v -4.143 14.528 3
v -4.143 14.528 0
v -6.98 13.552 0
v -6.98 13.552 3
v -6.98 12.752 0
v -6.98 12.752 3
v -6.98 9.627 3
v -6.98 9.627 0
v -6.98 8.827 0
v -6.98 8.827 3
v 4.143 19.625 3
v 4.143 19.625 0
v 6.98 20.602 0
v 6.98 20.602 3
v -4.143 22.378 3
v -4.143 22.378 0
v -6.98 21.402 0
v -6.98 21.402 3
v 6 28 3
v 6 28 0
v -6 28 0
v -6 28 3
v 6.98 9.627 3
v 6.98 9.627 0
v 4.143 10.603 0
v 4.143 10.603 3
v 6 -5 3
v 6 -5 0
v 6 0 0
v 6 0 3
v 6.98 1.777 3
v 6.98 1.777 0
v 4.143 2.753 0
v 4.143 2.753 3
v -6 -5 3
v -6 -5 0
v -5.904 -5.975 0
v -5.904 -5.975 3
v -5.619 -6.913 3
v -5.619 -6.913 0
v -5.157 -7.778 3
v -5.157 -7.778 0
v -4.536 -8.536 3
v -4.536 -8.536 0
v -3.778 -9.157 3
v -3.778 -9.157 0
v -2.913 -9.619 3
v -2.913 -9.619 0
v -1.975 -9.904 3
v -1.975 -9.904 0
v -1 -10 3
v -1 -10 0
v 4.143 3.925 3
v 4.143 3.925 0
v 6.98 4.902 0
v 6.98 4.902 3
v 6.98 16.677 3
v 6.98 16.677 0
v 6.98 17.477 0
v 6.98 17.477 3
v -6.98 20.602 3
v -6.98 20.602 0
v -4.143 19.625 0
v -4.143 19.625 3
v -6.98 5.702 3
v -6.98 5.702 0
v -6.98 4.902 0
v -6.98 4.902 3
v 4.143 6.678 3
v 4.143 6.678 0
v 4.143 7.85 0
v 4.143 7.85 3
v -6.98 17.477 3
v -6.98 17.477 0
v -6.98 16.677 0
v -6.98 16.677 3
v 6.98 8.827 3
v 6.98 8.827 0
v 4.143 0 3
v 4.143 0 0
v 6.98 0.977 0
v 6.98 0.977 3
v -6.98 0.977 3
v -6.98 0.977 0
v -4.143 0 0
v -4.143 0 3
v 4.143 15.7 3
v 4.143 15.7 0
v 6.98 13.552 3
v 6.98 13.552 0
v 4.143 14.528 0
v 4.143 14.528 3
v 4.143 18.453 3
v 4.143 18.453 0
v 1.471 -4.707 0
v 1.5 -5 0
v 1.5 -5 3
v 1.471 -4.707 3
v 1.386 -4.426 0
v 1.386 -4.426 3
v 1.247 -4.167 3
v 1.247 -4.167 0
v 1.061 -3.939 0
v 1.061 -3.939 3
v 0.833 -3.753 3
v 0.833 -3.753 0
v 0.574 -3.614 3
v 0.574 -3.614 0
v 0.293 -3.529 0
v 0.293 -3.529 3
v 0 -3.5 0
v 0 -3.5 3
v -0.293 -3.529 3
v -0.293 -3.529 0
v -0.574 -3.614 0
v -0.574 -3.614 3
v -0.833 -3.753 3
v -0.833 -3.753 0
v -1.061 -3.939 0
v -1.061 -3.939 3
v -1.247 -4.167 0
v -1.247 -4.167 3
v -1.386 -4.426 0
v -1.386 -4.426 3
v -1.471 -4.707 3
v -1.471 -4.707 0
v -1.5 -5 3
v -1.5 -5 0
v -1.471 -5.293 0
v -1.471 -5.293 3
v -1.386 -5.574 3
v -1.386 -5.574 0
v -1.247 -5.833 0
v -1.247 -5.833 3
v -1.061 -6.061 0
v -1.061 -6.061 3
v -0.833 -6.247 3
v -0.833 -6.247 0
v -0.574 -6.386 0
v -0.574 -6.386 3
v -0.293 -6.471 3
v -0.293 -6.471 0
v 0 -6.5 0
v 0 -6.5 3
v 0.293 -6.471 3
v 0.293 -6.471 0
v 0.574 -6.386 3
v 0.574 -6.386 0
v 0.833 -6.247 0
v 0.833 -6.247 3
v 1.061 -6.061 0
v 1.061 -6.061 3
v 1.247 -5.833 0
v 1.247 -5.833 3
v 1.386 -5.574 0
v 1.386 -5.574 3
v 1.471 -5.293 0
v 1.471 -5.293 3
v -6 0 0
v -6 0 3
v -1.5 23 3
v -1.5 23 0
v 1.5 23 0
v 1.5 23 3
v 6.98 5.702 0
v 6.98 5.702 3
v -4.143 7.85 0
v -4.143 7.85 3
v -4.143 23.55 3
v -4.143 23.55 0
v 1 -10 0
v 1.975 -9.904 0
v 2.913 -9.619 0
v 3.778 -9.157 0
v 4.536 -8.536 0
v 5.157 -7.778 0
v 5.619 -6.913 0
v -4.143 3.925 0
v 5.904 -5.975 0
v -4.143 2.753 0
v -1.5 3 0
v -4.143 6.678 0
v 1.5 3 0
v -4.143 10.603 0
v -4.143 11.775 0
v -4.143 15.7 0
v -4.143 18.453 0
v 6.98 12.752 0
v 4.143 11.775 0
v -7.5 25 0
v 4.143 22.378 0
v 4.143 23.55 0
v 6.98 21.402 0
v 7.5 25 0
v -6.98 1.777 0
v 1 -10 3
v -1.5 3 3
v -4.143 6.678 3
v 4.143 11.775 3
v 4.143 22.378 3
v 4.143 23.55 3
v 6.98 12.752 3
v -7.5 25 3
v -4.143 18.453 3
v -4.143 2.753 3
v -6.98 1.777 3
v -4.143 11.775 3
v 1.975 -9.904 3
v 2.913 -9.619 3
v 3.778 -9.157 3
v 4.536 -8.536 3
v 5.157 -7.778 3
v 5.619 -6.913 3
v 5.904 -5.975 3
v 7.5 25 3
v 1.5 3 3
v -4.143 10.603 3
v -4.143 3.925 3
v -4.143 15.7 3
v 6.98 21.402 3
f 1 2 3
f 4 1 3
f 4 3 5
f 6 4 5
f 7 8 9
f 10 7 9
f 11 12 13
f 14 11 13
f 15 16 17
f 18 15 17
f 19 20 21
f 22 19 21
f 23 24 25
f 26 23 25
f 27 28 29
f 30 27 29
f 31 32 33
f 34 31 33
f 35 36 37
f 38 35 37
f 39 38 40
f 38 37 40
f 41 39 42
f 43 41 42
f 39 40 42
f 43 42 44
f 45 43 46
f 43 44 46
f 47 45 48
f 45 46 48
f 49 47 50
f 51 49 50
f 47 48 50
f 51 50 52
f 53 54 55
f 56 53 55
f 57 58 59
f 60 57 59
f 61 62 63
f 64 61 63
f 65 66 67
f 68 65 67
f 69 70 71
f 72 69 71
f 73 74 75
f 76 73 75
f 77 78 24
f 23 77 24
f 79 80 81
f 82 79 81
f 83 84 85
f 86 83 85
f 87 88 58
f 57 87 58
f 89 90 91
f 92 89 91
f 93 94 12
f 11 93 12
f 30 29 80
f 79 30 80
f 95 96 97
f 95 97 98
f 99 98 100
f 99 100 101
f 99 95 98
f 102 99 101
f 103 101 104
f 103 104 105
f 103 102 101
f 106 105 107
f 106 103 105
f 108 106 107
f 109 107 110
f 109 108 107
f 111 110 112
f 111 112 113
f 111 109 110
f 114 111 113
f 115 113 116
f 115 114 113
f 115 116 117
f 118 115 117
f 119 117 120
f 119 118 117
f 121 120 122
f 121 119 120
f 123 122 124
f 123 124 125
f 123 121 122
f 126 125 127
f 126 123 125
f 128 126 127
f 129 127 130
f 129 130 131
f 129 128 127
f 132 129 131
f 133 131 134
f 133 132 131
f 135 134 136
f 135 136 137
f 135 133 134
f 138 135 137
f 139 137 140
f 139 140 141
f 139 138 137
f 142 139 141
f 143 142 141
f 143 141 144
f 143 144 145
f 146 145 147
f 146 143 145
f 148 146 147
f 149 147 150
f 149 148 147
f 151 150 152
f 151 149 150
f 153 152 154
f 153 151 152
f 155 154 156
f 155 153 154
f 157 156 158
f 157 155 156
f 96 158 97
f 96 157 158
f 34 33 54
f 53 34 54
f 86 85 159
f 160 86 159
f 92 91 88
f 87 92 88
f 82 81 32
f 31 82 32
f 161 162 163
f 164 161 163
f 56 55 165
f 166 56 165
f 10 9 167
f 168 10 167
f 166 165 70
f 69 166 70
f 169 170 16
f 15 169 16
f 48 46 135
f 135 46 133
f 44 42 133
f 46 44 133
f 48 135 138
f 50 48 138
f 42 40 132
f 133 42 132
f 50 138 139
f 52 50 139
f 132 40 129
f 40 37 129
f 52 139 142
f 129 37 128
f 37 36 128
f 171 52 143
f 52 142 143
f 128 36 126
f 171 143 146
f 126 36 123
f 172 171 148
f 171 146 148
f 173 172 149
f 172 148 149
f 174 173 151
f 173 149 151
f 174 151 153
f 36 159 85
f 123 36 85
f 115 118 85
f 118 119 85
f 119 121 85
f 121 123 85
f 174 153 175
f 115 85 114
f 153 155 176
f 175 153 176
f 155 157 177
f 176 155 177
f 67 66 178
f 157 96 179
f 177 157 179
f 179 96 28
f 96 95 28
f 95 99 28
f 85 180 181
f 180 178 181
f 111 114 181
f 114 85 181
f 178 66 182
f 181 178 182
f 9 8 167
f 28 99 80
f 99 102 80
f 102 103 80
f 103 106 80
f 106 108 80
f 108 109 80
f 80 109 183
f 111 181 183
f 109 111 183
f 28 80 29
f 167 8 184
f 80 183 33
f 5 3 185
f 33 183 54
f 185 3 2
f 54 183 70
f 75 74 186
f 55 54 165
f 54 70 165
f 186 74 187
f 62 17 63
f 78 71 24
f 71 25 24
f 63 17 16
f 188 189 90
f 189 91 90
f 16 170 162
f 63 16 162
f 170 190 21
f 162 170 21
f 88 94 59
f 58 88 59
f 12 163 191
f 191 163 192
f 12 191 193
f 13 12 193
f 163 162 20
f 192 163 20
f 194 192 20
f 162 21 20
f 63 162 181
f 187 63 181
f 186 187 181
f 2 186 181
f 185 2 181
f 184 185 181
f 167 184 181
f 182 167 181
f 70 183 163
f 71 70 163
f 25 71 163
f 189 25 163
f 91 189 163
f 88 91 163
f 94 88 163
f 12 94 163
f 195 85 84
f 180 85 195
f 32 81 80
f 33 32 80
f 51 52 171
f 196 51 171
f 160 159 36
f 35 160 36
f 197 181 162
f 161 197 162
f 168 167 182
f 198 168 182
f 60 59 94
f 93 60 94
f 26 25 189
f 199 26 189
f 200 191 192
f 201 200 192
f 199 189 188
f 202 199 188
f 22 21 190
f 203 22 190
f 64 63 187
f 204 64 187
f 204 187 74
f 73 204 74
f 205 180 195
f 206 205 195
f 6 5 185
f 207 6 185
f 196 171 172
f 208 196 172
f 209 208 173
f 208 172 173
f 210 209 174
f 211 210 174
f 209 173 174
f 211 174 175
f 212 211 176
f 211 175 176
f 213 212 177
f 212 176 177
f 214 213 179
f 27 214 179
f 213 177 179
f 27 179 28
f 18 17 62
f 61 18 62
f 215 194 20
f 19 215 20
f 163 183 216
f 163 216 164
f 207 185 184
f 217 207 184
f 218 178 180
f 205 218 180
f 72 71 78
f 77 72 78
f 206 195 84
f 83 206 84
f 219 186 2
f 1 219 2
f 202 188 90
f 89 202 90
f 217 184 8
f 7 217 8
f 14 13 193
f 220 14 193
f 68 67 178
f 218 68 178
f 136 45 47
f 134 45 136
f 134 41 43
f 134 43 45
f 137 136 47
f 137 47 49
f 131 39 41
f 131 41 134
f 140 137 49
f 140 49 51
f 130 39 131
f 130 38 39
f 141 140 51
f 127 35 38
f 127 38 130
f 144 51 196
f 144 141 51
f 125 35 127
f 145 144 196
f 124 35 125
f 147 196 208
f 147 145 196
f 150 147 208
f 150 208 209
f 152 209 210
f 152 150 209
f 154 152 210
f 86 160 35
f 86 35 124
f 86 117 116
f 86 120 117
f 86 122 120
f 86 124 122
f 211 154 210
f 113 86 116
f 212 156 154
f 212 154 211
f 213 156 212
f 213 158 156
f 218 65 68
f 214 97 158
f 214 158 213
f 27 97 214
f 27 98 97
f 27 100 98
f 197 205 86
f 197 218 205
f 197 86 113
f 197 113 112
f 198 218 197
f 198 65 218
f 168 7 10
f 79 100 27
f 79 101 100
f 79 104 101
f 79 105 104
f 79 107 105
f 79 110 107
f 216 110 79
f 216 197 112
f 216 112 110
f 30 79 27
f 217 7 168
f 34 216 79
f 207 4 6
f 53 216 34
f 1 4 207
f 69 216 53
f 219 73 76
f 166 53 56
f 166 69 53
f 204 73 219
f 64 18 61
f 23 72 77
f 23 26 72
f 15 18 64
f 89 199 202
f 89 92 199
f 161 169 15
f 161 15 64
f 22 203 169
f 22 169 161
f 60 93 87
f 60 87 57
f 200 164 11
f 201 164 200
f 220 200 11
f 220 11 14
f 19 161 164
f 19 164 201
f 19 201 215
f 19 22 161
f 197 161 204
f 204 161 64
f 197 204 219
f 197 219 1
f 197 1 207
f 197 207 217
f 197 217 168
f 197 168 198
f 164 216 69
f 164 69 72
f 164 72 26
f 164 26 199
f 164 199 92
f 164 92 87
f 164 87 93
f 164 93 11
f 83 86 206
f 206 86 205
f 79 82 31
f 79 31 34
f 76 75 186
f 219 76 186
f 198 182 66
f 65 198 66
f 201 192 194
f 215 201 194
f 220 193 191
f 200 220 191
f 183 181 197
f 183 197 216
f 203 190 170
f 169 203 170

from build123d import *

# Parameters (mm, degrees)
F0_R     = 1.5
F0_W     = 3
F0_H     = 20
F1_DEPTH = 3
F3_DEPTH = 25


with BuildPart() as f1:
    # F0 (on Top) → F1 (new body)
    with BuildSketch(Plane.XY):
        with BuildLine():
            Line((-7.5, 25), (-7.5, 0))
            Line((-7.5, 0), (-6, 0))
            Line((-6, 0), (-6, -5))
            ThreePointArc((-6, -5), (-4.535534, -8.535534), (-1, -10))
            Line((-1, -10), (1, -10))
            ThreePointArc((1, -10), (4.535534, -8.535534), (6, -5))
            Line((6, -5), (6, 0))
            Line((6, 0), (7.5, 0))
            Line((7.5, 0), (7.5, 25))
            Line((7.5, 25), (6, 28))
            Line((6, 28), (-6, 28))
            Line((-6, 28), (-7.5, 25))
        make_face()
        with Locations((0, -5)):
            Circle(F0_R, mode=Mode.SUBTRACT)
        with Locations((0, 13)):
            Rectangle(F0_W, F0_H, mode=Mode.SUBTRACT)
    extrude(amount=F1_DEPTH)

    # F2 (on face) → F3 (cut)
    with BuildSketch(Plane(origin=(0, 0, 0), x_dir=(1, 0, 0), z_dir=(0, 0, -1))):
        Polygon((-6.98, -0.976704), (-4.143444, 0), (-6, 0), (-7.5, 0), (-7.5, -25), (-4.143444, -23.55), (-4.143444, -22.378409), (-6.98, -21.401704), (-6.98, -20.601704), (-4.143444, -19.625), (-4.143444, -18.453409), (-6.98, -17.476704), (-6.98, -16.676704), (-4.143444, -15.7), (-4.143444, -14.528409), (-6.98, -13.551704), (-6.98, -12.751704), (-4.143444, -11.775), (-4.143444, -10.603409), (-6.98, -9.626704), (-6.98, -8.826704), (-4.143444, -7.85), (-4.143444, -6.678409), (-6.98, -5.701704), (-6.98, -4.901704), (-4.143444, -3.925), (-4.143444, -2.753409), (-6.98, -1.776704), align=None)
        Polygon((4.143444, -23.55), (7.5, -25), (7.5, 0), (6, 0), (4.143444, 0), (6.98, -0.976704), (6.98, -1.776704), (4.143444, -2.753409), (4.143444, -3.925), (6.98, -4.901704), (6.98, -5.701704), (4.143444, -6.678409), (4.143444, -7.85), (6.98, -8.826704), (6.98, -9.626704), (4.143444, -10.603409), (4.143444, -11.775), (6.98, -12.751704), (6.98, -13.551704), (4.143444, -14.528409), (4.143444, -15.7), (6.98, -16.676704), (6.98, -17.476704), (4.143444, -18.453409), (4.143444, -19.625), (6.98, -20.601704), (6.98, -21.401704), (4.143444, -22.378409), align=None)
    extrude(amount=-F3_DEPTH, mode=Mode.SUBTRACT)


solid = f1.part
